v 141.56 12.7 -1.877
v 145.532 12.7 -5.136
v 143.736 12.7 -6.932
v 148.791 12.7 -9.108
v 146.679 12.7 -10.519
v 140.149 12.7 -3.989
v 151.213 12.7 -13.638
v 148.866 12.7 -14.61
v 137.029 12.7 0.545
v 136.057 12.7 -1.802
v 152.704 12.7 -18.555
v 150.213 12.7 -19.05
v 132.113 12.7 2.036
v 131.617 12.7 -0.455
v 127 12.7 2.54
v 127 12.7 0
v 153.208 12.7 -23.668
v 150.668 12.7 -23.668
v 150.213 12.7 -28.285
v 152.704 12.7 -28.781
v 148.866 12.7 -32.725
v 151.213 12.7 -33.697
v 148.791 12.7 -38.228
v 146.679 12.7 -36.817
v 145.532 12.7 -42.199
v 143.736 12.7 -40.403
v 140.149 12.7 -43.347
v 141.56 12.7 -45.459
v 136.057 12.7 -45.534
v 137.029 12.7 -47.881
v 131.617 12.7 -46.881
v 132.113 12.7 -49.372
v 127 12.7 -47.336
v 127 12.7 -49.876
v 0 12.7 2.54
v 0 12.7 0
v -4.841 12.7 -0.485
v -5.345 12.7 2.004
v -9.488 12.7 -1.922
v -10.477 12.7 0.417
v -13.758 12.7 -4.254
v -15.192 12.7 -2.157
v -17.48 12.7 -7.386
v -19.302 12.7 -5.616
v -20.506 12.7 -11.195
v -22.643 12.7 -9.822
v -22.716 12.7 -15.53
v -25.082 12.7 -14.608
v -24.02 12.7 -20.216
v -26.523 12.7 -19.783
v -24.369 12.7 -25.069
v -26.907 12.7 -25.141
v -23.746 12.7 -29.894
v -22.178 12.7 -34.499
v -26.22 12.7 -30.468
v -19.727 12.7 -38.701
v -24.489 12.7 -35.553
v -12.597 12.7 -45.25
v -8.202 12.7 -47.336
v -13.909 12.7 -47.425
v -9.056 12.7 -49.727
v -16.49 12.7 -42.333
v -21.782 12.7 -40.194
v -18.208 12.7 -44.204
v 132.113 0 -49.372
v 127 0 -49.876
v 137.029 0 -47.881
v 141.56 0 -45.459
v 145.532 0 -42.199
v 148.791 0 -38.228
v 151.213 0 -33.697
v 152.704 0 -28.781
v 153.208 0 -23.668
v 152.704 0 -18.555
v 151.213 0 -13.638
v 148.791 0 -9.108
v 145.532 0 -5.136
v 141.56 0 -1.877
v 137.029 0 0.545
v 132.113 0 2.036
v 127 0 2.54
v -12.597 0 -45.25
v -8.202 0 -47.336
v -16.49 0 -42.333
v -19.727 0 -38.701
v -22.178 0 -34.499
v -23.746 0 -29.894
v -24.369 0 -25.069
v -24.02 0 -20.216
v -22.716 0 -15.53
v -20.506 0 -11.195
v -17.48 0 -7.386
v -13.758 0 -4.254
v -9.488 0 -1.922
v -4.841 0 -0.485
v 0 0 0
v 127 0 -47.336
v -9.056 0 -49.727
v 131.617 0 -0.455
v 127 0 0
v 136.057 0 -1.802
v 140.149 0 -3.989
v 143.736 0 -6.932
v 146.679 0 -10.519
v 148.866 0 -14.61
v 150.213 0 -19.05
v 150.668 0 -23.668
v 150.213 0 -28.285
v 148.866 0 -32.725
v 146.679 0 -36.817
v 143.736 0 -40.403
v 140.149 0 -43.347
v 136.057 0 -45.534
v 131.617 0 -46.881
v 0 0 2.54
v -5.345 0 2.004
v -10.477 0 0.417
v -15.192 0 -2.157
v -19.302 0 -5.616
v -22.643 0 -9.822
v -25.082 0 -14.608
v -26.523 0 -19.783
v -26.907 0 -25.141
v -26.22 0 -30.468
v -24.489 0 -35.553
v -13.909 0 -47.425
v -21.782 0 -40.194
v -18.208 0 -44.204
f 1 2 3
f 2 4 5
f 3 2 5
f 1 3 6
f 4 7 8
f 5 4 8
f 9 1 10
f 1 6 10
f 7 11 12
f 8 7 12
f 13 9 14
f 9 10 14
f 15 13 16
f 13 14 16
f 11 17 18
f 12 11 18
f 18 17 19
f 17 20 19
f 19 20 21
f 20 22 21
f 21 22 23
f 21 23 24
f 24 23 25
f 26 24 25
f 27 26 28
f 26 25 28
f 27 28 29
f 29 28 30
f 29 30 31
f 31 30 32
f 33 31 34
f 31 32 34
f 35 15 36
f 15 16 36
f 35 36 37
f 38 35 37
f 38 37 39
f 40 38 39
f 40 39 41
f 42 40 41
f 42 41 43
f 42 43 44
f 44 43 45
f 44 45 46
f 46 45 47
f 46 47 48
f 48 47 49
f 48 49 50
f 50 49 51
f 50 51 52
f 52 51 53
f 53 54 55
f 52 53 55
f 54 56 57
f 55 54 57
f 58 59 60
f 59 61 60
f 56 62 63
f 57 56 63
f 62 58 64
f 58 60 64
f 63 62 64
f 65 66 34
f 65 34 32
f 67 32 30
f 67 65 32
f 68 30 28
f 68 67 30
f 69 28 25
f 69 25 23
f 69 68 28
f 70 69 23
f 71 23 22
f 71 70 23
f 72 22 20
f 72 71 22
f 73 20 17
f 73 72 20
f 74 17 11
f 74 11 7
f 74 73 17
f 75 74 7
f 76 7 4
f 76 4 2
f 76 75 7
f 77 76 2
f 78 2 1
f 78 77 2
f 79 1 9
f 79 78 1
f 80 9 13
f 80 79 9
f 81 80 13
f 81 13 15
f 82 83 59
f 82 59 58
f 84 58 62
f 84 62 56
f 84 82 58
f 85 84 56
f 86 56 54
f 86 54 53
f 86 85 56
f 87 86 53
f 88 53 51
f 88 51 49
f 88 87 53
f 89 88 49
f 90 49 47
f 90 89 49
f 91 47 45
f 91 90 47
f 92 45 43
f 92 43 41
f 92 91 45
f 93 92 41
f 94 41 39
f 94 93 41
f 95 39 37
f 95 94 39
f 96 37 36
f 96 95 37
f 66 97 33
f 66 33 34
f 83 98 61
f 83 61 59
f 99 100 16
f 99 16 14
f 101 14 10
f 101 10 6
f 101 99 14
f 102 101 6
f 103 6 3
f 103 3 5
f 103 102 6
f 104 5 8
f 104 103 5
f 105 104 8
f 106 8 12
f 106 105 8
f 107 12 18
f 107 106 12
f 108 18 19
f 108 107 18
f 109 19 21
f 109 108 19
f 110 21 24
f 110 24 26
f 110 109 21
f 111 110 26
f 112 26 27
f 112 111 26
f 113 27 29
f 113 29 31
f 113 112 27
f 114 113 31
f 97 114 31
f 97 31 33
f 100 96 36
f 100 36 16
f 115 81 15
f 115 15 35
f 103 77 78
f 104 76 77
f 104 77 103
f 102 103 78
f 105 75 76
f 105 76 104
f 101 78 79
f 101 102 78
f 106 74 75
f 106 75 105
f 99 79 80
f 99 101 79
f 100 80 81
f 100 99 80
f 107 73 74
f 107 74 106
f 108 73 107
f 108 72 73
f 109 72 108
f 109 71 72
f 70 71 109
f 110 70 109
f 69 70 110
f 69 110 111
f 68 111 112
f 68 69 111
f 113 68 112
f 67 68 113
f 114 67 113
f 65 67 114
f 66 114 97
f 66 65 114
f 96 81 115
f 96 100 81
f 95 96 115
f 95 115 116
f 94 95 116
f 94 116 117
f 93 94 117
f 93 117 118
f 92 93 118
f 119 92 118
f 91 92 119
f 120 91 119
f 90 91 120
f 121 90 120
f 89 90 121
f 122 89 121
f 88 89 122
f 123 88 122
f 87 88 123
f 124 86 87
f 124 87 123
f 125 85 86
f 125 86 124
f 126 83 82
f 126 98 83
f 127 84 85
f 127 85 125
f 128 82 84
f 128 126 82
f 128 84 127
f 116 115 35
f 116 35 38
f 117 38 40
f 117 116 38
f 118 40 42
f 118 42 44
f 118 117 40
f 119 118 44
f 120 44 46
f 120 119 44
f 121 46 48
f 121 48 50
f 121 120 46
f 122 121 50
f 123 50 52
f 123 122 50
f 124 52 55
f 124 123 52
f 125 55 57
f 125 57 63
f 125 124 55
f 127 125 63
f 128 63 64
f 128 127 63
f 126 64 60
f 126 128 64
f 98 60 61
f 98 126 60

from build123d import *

# Parameters (mm, degrees)
EXTRUDE_THIN1_DEPTH = 12.7


with BuildPart() as part:
    # Sketch1 → Extrude-Thin1 (new body)
    with BuildSketch(Plane(origin=(0, 0, 0), x_dir=(1, 0, 0), z_dir=(0, 1, 0))):
        with BuildLine():
            ThreePointArc((-8.201608063, 47.335515762), (-24.020394602, 20.216381636), (0, 0))
            Line((0, 0), (127, 0))
            ThreePointArc((127, 0), (150.667757881, 23.667757881), (127, 47.335515762))
            Line((127, 47.335515762), (127, 49.875515762))
            ThreePointArc((127, 49.875515762), (153.207757881, 23.667757881), (127, -2.54))
            Line((127, -2.54), (0, -2.54))
            ThreePointArc((0, -2.54), (-26.52310557, 19.782748367), (-9.056142503, 49.727454493))
            Line((-9.056142503, 49.727454493), (-8.201608063, 47.335515762))
        make_face()
    extrude(amount=EXTRUDE_THIN1_DEPTH)


solid = part.part
